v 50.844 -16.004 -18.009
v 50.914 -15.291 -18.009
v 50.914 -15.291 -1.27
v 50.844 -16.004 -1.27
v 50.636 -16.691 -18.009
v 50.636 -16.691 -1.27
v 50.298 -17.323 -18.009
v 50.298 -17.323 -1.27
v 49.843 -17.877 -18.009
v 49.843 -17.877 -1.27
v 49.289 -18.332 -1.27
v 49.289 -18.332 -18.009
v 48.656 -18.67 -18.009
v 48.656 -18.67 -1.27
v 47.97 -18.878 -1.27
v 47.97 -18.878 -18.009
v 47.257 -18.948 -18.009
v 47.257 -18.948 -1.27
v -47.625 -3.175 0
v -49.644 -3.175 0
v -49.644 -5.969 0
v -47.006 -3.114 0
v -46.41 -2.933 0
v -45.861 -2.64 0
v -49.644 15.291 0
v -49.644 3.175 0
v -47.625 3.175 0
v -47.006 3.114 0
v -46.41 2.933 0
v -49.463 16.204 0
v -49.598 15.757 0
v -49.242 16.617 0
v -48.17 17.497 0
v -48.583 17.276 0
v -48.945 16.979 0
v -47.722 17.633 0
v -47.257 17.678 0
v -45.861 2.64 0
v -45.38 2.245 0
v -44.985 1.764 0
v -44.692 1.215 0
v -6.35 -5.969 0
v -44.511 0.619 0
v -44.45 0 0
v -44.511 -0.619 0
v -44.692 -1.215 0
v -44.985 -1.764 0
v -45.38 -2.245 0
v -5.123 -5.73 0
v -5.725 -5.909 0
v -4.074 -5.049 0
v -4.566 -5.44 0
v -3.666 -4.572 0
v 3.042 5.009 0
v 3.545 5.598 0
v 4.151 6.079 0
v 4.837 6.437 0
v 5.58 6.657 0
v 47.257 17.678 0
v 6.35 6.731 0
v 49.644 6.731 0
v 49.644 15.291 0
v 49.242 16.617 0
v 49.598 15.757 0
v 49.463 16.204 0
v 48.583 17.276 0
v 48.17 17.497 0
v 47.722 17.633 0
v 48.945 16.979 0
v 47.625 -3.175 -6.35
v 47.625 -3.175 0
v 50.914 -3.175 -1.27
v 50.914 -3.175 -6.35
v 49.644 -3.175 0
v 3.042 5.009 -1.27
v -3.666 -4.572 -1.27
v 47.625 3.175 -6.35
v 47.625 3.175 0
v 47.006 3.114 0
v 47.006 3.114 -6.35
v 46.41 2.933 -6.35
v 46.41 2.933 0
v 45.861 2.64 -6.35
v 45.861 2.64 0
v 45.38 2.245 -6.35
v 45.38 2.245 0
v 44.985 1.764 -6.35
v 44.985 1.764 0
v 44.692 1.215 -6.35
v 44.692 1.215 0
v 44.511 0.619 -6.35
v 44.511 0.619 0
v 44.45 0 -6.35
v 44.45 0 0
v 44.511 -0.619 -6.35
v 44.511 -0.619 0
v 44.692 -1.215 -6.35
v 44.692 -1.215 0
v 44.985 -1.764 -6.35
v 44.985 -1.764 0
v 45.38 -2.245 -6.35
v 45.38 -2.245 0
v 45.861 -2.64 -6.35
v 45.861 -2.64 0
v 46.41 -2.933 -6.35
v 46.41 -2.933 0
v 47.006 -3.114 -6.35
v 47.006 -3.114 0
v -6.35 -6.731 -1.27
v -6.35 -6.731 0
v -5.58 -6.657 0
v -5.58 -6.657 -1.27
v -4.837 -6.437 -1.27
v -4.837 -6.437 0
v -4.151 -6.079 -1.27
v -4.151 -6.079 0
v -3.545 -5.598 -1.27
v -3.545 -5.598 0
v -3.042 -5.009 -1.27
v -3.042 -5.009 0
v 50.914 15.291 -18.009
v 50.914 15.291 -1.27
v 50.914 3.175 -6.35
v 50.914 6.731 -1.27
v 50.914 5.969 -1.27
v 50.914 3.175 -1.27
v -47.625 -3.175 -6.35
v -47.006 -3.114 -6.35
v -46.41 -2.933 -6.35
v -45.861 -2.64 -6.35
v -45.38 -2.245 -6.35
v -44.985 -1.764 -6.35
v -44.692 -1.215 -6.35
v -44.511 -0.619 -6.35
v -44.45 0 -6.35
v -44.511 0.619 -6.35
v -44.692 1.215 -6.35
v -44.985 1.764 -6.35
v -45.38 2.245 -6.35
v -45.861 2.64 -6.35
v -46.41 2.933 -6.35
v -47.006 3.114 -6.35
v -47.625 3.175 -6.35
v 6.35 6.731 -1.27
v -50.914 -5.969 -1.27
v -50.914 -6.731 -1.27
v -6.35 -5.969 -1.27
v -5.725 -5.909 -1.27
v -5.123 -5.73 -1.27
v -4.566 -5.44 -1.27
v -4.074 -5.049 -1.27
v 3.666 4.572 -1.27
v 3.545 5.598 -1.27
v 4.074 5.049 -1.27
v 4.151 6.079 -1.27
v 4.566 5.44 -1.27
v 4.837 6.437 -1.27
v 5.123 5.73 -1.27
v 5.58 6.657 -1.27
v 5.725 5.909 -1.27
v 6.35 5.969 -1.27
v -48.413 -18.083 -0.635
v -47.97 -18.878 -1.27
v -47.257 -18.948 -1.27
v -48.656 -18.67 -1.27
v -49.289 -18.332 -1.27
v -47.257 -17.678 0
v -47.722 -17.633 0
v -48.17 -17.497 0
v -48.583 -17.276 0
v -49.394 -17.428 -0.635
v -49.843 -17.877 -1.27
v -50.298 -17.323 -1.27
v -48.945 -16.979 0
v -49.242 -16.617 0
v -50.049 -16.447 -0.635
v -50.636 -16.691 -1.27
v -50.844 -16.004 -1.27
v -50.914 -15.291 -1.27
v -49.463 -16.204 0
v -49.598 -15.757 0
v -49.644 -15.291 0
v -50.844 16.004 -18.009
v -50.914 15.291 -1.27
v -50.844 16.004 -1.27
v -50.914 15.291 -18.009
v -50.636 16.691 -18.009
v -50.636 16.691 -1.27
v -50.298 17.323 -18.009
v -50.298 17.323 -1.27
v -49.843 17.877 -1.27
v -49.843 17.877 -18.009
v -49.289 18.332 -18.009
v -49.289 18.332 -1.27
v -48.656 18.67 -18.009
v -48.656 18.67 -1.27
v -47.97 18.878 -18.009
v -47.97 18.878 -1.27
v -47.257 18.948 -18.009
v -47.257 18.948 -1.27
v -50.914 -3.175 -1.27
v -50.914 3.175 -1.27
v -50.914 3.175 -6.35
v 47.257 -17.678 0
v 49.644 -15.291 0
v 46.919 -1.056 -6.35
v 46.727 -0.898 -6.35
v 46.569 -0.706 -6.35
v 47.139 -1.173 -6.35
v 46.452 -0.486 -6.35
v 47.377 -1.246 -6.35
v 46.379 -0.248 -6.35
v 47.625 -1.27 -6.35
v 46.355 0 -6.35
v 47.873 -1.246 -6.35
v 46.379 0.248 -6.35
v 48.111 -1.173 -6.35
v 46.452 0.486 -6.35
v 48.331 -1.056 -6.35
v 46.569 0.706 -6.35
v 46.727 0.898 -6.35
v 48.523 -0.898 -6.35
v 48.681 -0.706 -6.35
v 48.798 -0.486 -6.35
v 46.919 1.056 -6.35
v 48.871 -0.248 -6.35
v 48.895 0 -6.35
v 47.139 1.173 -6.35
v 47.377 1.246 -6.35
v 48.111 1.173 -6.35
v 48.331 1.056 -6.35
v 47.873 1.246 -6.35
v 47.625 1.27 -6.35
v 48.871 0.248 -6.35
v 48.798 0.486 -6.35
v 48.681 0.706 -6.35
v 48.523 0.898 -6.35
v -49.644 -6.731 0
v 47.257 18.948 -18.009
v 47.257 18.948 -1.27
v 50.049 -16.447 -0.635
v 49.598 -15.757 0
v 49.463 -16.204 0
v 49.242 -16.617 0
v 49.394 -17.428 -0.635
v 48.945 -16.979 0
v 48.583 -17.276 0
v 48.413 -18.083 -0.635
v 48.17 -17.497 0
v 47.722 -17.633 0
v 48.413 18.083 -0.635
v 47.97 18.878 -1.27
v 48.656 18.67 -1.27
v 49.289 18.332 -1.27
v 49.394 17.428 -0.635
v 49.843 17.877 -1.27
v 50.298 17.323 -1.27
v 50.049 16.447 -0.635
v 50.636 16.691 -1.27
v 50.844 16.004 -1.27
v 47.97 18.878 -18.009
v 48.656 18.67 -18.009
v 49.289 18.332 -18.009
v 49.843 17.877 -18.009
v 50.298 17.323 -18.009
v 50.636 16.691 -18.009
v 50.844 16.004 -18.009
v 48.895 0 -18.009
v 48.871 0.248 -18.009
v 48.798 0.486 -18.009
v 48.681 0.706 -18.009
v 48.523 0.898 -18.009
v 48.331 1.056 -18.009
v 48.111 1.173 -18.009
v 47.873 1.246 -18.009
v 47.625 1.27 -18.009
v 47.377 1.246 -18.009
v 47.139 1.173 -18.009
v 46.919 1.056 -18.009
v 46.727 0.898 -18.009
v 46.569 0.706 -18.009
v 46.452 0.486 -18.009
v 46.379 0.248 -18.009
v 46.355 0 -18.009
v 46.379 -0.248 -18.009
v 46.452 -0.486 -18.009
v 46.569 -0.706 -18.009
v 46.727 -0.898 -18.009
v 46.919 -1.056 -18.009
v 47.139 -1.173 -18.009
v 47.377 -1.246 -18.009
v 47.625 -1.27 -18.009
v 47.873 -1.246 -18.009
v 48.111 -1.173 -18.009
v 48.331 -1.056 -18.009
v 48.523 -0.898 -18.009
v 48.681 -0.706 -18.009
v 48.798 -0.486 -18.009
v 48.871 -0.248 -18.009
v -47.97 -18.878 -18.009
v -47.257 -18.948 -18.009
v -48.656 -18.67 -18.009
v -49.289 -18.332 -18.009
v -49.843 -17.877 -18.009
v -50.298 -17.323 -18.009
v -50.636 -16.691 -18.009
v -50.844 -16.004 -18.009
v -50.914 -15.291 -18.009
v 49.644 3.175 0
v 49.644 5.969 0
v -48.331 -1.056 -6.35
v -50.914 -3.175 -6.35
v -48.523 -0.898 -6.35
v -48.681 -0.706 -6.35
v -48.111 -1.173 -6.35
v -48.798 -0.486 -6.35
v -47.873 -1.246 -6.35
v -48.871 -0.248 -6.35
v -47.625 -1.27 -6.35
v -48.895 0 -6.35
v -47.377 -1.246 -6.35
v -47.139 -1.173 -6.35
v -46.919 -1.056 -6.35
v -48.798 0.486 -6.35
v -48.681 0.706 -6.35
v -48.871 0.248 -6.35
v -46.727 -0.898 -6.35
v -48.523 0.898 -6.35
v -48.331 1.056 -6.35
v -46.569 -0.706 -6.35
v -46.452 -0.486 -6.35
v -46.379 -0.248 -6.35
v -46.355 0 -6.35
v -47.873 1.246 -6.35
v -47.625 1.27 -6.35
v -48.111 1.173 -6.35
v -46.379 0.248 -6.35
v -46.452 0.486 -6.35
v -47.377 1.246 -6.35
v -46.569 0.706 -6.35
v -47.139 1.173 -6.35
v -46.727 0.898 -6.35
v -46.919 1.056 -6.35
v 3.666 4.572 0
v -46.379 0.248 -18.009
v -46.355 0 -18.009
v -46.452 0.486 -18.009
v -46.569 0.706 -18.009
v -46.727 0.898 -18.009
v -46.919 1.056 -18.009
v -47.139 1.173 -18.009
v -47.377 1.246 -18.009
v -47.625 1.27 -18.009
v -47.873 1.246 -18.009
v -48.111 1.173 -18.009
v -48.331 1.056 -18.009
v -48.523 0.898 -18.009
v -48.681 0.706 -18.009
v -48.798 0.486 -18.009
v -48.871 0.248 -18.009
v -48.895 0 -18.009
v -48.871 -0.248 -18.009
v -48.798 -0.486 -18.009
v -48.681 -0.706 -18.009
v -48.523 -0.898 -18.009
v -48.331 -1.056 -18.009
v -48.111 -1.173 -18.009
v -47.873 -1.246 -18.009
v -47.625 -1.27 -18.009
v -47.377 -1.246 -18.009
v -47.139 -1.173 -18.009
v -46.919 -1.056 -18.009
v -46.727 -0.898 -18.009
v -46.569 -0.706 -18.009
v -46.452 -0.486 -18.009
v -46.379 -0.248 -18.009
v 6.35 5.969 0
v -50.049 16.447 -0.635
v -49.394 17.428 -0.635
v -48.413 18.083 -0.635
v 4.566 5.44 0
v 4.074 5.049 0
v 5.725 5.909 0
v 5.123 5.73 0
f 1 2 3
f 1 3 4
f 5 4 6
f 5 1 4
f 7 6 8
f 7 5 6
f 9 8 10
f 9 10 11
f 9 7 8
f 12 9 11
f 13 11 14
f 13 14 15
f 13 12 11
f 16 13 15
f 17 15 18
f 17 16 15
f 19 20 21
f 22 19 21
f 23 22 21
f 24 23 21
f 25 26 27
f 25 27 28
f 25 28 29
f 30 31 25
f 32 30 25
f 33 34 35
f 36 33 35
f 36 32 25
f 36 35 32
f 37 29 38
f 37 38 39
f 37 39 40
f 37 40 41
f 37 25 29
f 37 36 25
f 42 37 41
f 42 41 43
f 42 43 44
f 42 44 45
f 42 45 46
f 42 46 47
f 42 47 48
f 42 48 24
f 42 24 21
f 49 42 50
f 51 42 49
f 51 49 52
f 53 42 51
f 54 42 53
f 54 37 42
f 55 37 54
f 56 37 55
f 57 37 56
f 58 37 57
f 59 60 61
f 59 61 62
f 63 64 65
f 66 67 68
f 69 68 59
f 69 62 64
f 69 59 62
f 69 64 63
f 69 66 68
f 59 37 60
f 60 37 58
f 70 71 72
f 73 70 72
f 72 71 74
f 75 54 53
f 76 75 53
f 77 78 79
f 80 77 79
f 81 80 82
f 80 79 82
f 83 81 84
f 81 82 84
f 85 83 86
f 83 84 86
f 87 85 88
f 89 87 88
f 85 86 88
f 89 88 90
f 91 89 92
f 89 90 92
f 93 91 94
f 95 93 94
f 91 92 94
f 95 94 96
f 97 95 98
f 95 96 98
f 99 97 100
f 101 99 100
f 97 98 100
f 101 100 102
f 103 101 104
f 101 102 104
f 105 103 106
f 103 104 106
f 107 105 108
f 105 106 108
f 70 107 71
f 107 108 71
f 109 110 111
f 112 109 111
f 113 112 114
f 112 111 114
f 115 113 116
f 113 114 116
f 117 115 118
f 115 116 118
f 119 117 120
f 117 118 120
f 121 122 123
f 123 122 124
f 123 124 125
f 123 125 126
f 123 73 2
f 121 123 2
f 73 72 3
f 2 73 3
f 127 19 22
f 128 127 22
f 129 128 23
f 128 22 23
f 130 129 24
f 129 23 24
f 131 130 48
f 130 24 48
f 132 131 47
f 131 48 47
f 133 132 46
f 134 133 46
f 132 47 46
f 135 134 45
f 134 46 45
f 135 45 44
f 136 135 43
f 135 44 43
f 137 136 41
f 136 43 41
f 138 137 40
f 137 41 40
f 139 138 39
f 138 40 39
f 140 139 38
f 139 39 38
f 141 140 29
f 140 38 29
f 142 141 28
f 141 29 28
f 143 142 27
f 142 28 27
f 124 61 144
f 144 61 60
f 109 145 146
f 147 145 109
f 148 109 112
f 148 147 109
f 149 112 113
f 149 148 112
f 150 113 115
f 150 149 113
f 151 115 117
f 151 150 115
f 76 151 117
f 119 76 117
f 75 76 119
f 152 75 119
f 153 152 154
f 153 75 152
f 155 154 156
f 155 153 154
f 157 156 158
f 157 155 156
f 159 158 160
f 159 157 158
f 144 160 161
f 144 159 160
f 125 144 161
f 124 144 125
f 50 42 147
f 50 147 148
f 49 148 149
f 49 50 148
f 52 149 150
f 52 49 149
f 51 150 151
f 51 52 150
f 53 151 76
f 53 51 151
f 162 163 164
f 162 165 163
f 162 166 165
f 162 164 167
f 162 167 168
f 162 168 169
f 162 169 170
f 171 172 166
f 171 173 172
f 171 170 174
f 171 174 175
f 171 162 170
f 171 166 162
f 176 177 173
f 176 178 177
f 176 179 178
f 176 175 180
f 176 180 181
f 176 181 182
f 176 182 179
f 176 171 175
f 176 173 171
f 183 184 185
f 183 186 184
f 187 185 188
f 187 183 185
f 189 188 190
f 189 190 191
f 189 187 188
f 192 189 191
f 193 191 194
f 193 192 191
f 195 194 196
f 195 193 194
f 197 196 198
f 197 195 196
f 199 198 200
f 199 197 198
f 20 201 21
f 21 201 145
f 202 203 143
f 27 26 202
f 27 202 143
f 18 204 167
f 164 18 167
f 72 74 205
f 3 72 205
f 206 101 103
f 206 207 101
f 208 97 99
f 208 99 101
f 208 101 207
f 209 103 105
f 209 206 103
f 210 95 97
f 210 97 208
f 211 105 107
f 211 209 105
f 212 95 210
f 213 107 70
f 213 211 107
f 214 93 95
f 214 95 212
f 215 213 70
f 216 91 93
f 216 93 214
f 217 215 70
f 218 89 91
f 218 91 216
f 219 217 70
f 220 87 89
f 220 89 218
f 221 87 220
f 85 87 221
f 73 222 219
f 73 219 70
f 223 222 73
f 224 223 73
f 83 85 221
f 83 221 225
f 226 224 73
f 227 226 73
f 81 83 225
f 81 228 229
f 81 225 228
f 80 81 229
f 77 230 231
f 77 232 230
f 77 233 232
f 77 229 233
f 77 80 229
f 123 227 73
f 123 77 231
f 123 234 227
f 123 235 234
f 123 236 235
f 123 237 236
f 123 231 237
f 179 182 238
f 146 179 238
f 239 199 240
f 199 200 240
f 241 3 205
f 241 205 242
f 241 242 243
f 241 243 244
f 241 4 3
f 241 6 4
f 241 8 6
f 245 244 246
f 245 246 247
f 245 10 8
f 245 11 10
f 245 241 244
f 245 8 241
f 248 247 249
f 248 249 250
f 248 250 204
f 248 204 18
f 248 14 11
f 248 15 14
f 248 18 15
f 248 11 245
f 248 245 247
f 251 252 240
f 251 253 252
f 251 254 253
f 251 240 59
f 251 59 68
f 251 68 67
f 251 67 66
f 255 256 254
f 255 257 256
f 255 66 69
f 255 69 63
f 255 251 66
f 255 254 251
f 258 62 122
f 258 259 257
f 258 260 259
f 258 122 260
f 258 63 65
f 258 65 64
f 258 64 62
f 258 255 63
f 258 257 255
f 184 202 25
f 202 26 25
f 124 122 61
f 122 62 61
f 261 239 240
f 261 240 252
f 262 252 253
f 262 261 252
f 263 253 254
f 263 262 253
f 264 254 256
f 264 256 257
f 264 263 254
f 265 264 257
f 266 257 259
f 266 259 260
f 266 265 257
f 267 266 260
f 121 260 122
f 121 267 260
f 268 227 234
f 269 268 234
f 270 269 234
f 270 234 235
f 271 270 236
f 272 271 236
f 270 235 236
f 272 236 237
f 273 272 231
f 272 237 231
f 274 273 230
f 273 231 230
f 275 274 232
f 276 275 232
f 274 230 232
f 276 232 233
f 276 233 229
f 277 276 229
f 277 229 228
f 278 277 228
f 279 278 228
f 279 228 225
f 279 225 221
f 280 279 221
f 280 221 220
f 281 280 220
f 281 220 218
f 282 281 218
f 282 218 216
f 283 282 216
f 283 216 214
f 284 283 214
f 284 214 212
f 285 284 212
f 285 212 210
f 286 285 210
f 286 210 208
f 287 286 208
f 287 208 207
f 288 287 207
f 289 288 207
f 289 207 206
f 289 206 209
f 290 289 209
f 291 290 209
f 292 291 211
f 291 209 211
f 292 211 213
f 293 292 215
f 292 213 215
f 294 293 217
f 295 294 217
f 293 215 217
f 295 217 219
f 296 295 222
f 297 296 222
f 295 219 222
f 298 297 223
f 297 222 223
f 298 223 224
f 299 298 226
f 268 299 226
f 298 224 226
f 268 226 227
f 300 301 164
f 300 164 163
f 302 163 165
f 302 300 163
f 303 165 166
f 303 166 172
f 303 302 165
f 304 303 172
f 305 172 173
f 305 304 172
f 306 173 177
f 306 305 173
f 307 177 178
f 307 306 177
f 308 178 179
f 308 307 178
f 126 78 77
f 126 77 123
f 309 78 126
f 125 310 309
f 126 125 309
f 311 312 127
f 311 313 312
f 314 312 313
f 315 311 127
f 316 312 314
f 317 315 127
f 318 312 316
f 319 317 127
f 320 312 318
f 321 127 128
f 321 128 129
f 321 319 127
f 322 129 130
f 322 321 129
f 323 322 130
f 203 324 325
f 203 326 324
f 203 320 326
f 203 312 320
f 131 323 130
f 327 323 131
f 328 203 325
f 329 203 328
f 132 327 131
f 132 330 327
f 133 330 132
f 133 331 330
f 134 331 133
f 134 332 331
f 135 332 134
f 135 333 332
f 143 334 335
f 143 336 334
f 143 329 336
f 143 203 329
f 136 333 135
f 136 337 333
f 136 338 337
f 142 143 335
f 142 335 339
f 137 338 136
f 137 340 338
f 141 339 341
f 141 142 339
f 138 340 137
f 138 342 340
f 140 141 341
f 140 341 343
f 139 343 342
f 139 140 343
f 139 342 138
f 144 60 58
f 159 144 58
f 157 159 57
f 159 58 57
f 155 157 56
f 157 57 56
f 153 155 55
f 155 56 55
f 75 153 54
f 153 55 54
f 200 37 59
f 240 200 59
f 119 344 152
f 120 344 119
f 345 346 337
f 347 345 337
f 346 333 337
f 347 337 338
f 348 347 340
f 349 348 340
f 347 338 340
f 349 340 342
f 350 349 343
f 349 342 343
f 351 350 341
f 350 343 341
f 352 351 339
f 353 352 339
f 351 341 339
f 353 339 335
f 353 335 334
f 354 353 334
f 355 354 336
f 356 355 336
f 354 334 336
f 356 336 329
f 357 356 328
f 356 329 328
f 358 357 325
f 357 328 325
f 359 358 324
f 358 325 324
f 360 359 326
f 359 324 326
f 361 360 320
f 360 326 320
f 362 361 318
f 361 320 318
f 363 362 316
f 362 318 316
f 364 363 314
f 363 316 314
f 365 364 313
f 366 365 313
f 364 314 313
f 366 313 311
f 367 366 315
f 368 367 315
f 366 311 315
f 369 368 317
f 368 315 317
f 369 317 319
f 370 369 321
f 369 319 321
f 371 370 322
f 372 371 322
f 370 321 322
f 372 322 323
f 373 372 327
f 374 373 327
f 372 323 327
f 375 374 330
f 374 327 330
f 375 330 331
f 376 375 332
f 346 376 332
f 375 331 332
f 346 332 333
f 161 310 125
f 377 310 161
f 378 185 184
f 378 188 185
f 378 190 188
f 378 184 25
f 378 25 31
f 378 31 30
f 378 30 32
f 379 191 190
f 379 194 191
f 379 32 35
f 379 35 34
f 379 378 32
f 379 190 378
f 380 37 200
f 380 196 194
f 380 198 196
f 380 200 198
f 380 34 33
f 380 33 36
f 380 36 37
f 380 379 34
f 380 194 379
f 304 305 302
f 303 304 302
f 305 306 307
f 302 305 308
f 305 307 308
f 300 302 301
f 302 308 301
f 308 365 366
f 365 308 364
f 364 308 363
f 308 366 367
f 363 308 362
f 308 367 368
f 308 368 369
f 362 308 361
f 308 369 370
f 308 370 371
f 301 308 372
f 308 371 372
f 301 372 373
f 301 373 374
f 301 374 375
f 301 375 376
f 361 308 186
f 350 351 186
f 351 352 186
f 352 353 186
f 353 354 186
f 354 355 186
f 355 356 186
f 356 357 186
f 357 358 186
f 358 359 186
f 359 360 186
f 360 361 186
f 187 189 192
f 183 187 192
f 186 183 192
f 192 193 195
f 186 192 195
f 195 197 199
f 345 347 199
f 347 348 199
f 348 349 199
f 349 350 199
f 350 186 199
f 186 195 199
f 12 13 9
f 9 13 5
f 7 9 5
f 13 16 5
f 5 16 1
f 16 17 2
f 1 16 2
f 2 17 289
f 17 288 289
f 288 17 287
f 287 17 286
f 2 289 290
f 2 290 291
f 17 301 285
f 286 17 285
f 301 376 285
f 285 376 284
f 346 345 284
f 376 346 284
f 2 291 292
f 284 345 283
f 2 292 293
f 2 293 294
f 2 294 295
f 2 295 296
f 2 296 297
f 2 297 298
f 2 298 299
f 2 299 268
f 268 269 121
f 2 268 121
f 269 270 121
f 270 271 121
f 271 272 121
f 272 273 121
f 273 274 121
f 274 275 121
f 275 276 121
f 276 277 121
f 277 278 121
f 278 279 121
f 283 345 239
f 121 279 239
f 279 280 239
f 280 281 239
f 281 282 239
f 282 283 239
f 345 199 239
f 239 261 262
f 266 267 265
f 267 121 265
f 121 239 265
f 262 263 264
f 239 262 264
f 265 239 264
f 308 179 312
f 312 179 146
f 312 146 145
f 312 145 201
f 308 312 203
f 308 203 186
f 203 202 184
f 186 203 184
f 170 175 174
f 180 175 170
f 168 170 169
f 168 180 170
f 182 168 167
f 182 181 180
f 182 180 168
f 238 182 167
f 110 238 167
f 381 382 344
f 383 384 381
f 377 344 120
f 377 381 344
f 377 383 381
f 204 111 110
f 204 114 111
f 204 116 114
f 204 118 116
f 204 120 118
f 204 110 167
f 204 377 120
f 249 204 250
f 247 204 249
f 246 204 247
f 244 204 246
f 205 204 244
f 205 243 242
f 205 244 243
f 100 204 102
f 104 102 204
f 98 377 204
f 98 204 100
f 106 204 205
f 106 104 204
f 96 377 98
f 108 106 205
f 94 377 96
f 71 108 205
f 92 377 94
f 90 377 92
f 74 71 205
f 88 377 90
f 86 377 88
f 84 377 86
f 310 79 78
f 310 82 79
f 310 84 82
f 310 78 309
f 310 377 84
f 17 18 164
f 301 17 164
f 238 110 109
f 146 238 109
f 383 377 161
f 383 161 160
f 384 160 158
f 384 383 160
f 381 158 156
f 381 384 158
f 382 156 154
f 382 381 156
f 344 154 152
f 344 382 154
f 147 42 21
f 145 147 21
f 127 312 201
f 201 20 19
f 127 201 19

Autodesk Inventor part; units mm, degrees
ref_plane "YZ Plane" through (0, 0, 0) normal (1, 0, 0) x (0, 1, 0)
ref_plane "XZ Plane" through (0, 0, 0) normal (0, 1, 0) x (-1, 0, 0)
ref_plane "XY Plane" through (0, 0, 0) normal (0, 0, 1) x (1, 0, 0)
sketch "FishmanModern8" plane through (0, 0, 0) normal (0, 0, 1) x (1, 0, 0)
  line L0 (-50.9143, 0) -> (50.9143, 0) construction
  line L1 (0, 18.9484) -> (0, -18.9484) construction
  line L2 (-50.9143, 18.9484) -> (50.9143, 18.9484)
  line L3 (50.9143, 18.9484) -> (50.9143, -18.9484)
  line L4 (50.9143, -18.9484) -> (-50.9143, -18.9484)
  line L5 (-50.9143, -18.9484) -> (-50.9143, 18.9484)
  circle A0 centre (-47.625, 0) radius 1.27
  circle A1 centre (47.625, 0) radius 1.27
  line L6 (-3.3542, -4.7903) -> (3.3542, 4.7903)
  line L7 (-6.3503, -6.35) -> (-50.9143, -6.35)
  line L8 (6.3503, 6.35) -> (50.9143, 6.35)
  circle A2 centre (-47.625, 0) radius 3.175
  circle A3 centre (47.625, 0) radius 3.175
  line L9 (-50.9143, 3.175) -> (-47.625, 3.175)
  line L10 (-50.9143, -3.175) -> (-47.625, -3.175)
  line L11 (47.625, 3.175) -> (50.9143, 3.175)
  line L12 (47.625, -3.175) -> (50.9143, -3.175)
  arc A4 (6.3503, 6.35) -> (3.3542, 4.7903) centre (6.3503, 2.6924) ccw
  arc A5 (-6.3503, -6.35) -> (-3.3542, -4.7903) centre (-6.3503, -2.6924) ccw
  line L13 (50.9143, 6.731) -> (6.3503, 6.731)
  arc A6 (6.3503, 6.731) -> (3.0421, 5.0088) centre (6.3503, 2.6924) ccw
  line L14 (3.0421, 5.0088) -> (-3.6663, -4.5718)
  arc A7 (-6.3503, -5.969) -> (-3.6663, -4.5718) centre (-6.3503, -2.6924) ccw
  line L15 (-6.3503, -5.969) -> (-50.9143, -5.969)
  line L16 (50.9143, 5.969) -> (6.3503, 5.969)
  arc A8 (6.3503, 5.969) -> (3.6663, 4.5718) centre (6.3503, 2.6924) ccw
  line L17 (3.6663, 4.5718) -> (-3.0421, -5.0088)
  arc A9 (-6.3503, -6.731) -> (-3.0421, -5.0088) centre (-6.3503, -2.6924) ccw
  line L18 (-6.3503, -6.731) -> (-50.9143, -6.731)
  line L19 (-50.9143, -5.969) -> (-50.9143, -6.731)
  line L20 (50.9143, 6.731) -> (50.9143, 5.969)
  point P0 (0, 0)
  point P1 (0, 0)
  dimension "d72" = 101.8286
  dimension "d73" = 37.8968
  dimension "d74" = 2.54
  dimension "d75" = 95.25
  dimension "d76" = 47.625
  dimension "d77" = 47.625
  dimension "d78" = 55
  dimension "d79" = 6.35
  dimension "d80" = 6.35
  dimension "d81" = 6.35
  dimension "d85" = 3.6576
  dimension "d86" = 0.381
  dimension "d87" = 0.381
extrude "FishmanModern8Feature" add sketch "FishmanModern8" against normal blind 18.0086 contours L2 L3 L13 A6 L14 A7 L15 L5 L10 A2 L9 | L9 A2 L10 L5 | L3 L8 A4 L6 A5 L7 L5 L15 A7 L14 A6 L13 | A2 | L3 L16 A8 L17 A9 L18 L5 L7 A5 L6 A4 L8 | L3 L11 A3 L12 L4 L5 L18 A9 L17 A8 L16 | L3 L12 A3 L11 | A3 | A0 | A1
fillet "FishmanModern8FilletsFeature" radius 3.6576 4 edges at (-50.9143, 18.9484, -9.0043) (-50.9143, -18.9484, -9.0043) (50.9143, 18.9484, -9.0043) (50.9143, -18.9484, -9.0043)
extrude "FishmanModern8IndentFeature" cut sketch "FishmanModern8" against normal blind 1.27 contours L3 L8 A4 L6 A5 L7 L5 L15 A7 L14 A6 L13 | L3 L16 A8 L17 A9 L18 L5 L7 A5 L6 A4 L8
extrude "FishmanModern8MountsFeature" cut sketch "FishmanModern8" against normal through all contours A0 | A1
extrude "FishmanModern8CountersinksFeature" cut sketch "FishmanModern8" against normal blind 6.35 contours L9 A2 L10 L5 | A2 | L3 L12 A3 L11 | A3 | A1
chamfer "FishmanModern8ChamferFeature" distance 1.27 angle 45 12 edges at (0, 18.9484, 0) (-49.843, 17.8771, 0) (-50.9143, 9.2329, 0) (49.843, 17.8771, 0) (50.9143, 11.0109, 0) (0, -18.9484, 0) (49.843, -17.8771, 0) (50.9143, -9.2329, 0) (-49.843, -17.8771, 0) (-50.9143, -11.0109, 0) (-50.9143, -4.572, 0) (50.9143, 4.572, 0)
equation "\"d76\" = d77"
properties part number "fishman-modern8"
